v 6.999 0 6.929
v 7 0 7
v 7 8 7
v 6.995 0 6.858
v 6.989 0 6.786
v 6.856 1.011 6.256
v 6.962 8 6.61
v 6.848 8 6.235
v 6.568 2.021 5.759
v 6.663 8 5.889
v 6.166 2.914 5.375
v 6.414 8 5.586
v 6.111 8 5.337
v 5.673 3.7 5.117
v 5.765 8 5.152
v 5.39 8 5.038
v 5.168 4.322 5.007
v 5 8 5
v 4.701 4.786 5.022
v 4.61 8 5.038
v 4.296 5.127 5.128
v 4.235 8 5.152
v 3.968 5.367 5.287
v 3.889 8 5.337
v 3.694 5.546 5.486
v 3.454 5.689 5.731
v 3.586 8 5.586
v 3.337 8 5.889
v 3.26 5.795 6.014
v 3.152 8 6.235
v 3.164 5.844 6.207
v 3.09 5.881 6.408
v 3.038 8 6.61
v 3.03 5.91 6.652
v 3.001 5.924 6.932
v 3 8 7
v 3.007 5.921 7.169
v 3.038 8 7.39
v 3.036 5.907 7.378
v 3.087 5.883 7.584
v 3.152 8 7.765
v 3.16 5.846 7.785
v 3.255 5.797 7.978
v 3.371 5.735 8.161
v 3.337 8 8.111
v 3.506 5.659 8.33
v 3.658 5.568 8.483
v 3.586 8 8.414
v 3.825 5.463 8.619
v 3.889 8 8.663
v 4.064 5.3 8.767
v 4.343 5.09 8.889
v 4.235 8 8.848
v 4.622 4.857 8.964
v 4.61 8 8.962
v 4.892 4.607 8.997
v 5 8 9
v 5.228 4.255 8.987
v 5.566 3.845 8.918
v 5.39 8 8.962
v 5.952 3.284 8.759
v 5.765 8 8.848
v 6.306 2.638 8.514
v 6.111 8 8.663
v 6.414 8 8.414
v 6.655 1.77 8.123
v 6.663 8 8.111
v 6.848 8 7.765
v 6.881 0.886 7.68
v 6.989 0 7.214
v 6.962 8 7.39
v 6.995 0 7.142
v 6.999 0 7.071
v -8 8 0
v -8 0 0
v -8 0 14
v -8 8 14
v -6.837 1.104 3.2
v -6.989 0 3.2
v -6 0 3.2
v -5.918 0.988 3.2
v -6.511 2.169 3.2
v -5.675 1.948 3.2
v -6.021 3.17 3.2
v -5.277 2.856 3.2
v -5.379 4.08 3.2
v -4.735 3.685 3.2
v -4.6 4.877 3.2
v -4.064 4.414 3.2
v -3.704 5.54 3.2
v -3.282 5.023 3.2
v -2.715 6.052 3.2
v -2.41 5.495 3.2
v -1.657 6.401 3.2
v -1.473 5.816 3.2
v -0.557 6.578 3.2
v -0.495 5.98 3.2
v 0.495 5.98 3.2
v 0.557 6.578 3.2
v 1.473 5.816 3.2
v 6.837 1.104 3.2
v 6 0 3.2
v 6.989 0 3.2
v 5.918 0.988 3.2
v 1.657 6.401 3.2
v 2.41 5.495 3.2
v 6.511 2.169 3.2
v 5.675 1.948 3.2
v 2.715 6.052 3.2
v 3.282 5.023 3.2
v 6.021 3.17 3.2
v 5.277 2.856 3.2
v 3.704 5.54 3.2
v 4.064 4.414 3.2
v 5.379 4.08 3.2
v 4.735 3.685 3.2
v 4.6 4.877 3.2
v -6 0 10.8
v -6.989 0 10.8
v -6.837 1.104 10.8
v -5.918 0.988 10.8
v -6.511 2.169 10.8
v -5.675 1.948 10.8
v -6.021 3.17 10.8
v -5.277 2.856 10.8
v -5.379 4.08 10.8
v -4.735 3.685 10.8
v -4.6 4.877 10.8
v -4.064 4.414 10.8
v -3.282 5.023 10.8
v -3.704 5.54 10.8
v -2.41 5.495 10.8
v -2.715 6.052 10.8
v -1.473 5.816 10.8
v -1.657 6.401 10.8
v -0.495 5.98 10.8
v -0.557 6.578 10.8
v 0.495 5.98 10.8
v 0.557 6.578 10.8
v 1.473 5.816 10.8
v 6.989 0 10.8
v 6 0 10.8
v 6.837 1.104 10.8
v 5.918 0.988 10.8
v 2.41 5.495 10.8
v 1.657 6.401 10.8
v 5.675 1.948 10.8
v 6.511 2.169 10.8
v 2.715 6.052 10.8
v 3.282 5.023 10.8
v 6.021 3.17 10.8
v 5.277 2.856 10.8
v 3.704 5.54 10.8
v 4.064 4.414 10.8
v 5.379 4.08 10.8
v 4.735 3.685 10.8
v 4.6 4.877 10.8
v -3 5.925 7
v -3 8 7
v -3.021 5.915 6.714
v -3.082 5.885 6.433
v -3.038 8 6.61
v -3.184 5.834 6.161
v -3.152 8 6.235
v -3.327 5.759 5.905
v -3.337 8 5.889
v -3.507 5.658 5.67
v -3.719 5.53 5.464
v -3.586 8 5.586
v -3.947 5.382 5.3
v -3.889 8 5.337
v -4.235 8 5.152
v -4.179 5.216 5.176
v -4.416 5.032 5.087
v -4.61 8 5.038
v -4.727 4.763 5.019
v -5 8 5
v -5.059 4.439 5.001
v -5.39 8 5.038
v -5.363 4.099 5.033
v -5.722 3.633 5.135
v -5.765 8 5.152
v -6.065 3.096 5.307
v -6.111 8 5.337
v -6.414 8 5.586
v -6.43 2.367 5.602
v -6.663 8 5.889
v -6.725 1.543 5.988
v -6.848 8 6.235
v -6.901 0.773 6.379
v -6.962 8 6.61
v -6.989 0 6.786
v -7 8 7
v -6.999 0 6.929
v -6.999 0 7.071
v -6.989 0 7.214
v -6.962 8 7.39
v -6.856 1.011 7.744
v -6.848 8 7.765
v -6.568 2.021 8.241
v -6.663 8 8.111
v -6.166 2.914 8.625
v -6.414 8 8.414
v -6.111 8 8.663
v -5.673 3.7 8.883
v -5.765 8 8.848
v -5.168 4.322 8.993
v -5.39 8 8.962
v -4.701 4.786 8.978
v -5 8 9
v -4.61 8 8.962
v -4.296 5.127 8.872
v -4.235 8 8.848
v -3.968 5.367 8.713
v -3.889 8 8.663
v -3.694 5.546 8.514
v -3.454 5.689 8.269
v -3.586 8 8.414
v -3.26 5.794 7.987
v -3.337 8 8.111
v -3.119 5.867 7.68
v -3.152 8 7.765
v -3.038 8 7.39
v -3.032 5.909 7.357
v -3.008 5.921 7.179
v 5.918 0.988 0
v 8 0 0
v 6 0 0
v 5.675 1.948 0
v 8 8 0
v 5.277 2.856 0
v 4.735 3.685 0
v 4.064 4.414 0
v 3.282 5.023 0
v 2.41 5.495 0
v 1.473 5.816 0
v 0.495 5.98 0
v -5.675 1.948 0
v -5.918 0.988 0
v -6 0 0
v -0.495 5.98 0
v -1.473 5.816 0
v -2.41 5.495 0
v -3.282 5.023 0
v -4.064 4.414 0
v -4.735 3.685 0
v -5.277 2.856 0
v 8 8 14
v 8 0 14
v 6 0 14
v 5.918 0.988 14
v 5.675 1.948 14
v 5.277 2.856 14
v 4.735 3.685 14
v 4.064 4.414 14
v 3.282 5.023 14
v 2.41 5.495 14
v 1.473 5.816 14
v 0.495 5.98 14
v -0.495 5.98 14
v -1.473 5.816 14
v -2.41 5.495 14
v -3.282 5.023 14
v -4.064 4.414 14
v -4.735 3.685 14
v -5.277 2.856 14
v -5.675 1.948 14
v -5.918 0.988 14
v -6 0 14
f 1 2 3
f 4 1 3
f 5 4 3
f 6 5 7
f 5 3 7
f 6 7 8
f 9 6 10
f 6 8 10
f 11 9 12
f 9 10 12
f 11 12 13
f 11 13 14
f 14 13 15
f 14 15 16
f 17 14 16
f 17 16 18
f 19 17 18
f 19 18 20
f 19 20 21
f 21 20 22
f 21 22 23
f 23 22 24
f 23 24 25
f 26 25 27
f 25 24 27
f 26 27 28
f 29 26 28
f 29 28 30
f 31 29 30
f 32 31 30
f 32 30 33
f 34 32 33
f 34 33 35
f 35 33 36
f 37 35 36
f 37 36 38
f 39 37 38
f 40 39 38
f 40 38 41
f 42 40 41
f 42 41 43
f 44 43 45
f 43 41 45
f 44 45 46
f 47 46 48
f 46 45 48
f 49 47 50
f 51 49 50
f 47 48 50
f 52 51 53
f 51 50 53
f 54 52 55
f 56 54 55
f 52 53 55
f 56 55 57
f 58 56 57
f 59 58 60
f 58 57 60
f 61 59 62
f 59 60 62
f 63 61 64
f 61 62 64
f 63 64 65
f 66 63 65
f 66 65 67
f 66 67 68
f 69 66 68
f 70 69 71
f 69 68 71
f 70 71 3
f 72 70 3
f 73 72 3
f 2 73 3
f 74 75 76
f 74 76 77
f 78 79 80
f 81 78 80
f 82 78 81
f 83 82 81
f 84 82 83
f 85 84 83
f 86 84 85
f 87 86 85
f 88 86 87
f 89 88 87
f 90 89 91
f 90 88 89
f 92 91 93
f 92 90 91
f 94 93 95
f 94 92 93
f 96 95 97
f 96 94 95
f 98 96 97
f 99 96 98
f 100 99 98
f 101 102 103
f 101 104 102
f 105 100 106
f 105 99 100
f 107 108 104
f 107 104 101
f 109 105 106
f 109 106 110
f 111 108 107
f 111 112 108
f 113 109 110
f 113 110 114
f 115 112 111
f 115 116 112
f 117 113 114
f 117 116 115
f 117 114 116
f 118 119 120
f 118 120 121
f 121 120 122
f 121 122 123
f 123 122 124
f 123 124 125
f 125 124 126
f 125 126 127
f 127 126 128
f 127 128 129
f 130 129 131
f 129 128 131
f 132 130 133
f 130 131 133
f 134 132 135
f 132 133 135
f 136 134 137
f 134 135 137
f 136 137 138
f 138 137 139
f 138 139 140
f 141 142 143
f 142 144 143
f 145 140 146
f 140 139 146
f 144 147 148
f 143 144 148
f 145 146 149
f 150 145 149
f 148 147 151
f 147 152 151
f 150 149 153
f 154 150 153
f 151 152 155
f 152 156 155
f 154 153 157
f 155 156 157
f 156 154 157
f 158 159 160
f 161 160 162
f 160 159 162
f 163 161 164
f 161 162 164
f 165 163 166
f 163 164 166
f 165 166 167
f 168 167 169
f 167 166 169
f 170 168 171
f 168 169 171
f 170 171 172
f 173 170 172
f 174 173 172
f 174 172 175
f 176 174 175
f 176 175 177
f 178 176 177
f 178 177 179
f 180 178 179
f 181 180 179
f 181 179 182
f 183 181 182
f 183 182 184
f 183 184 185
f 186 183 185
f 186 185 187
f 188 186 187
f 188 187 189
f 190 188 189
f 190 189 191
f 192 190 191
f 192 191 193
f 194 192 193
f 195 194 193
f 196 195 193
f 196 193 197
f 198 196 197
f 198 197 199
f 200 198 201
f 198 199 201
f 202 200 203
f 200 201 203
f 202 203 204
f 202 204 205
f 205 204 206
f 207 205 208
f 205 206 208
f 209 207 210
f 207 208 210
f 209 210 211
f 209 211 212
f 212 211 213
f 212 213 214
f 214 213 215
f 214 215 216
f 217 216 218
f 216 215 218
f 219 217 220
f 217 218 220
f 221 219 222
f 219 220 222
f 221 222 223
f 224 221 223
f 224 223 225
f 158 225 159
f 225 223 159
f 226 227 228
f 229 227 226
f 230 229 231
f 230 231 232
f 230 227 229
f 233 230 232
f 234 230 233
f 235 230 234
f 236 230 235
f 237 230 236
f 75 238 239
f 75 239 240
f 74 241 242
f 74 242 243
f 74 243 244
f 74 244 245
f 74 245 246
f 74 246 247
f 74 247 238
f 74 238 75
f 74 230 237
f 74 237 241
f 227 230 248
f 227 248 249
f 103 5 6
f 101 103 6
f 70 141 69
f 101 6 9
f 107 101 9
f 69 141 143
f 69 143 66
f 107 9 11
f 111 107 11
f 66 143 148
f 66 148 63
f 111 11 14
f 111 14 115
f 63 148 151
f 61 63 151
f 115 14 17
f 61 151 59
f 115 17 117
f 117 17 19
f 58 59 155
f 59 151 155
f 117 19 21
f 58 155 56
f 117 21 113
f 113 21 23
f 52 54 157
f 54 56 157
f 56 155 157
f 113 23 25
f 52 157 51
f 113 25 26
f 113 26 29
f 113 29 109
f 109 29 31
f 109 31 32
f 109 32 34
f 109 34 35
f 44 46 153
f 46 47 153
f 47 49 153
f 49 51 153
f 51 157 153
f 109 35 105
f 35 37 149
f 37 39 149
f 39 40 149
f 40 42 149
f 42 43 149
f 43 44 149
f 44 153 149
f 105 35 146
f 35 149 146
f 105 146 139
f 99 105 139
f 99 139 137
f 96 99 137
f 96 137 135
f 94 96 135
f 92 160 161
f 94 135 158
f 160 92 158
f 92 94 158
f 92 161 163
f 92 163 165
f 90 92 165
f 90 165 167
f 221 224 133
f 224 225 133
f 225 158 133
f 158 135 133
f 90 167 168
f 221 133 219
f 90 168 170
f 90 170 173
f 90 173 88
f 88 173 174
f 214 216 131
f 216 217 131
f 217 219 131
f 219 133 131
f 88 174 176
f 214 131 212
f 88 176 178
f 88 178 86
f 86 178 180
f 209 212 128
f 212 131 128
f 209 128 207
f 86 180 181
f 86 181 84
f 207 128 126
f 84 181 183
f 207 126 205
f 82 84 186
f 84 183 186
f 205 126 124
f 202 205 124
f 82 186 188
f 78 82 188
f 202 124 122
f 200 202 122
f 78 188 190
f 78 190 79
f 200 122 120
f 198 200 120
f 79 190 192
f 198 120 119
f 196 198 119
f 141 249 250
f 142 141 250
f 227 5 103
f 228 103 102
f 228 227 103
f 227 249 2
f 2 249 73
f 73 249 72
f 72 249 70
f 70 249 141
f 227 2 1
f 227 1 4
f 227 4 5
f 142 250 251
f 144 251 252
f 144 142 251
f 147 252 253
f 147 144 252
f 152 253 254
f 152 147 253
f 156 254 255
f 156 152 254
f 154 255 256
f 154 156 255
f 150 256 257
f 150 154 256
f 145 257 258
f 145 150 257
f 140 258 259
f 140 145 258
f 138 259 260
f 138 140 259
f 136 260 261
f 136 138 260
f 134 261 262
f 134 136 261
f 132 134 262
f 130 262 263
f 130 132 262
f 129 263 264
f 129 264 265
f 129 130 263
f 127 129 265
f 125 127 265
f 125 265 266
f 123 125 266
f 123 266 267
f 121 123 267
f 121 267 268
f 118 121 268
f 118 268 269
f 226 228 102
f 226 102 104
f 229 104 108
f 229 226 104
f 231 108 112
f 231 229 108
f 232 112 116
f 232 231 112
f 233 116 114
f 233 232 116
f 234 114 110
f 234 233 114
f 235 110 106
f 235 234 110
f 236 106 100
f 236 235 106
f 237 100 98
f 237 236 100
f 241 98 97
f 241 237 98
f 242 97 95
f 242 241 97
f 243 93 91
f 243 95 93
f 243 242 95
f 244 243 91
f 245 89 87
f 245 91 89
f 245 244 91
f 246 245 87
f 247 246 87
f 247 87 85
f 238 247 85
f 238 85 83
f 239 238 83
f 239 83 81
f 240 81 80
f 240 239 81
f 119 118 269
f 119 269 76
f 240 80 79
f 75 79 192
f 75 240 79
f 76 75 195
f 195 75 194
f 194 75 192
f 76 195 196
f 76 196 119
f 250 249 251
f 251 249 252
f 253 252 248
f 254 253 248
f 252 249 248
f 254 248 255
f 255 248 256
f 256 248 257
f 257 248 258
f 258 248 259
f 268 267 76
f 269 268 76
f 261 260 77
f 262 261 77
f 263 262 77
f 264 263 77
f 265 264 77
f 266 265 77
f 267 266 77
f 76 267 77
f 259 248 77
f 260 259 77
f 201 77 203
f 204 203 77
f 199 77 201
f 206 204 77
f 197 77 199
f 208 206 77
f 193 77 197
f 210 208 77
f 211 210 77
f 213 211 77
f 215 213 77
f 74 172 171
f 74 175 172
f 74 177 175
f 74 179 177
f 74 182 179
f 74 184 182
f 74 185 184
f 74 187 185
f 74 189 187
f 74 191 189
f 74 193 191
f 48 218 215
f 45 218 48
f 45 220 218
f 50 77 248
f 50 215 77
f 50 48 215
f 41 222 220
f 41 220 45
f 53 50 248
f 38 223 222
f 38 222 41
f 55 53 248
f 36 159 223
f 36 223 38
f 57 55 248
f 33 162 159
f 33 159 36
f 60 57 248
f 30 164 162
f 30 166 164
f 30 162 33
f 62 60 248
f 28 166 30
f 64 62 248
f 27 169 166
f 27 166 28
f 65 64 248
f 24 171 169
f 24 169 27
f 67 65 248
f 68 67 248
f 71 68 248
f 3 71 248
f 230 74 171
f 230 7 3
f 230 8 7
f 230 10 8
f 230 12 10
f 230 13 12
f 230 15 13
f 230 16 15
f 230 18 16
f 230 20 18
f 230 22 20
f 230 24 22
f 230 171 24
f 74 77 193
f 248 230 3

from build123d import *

# Parameters (mm, degrees)
EXTRUSION1_DEPTH      = 14
ESQUISSE3_R           = 7
EXTRUSION2_DEPTH      = 3.8
EXTRUSION2_DEPTH_BACK = 3.8
ESQUISSE4_R           = 2
EXTRUSION3_DEPTH      = 9


with BuildPart() as part:
    # Esquisse1 → Extrusion1 (new body)
    with BuildSketch(Plane.XY):
        with BuildLine():
            Line((8, 0), (6, 0))
            ThreePointArc((6, 0), (0, 6), (-6, 0))
            Line((-6, 0), (-8, 0))
            Line((-8, 0), (-8, 8))
            Line((-8, 8), (8, 8))
            Line((8, 8), (8, 0))
        make_face()
    extrude(amount=EXTRUSION1_DEPTH)

    # Esquisse3 → Extrusion2 (cut, two sides)
    with BuildSketch(Plane.XY.offset(7)) as extrusion2_sk:
        with Locations((0, -0.399862153)):
            Circle(ESQUISSE3_R)
    extrude(amount=EXTRUSION2_DEPTH, mode=Mode.SUBTRACT)
    extrude(extrusion2_sk.sketch, amount=-EXTRUSION2_DEPTH_BACK, mode=Mode.SUBTRACT)

    # Esquisse4 → Extrusion3 (cut, through all)
    with BuildSketch(Plane(origin=(0, 8, 0), x_dir=(1, 0, 0), z_dir=(0, 1, 0))):
        with Locations((-5, -7)):
            Circle(ESQUISSE4_R)
        with Locations((5, -7)):
            Circle(ESQUISSE4_R)
    extrude(amount=-EXTRUSION3_DEPTH, mode=Mode.SUBTRACT)


solid = part.part
